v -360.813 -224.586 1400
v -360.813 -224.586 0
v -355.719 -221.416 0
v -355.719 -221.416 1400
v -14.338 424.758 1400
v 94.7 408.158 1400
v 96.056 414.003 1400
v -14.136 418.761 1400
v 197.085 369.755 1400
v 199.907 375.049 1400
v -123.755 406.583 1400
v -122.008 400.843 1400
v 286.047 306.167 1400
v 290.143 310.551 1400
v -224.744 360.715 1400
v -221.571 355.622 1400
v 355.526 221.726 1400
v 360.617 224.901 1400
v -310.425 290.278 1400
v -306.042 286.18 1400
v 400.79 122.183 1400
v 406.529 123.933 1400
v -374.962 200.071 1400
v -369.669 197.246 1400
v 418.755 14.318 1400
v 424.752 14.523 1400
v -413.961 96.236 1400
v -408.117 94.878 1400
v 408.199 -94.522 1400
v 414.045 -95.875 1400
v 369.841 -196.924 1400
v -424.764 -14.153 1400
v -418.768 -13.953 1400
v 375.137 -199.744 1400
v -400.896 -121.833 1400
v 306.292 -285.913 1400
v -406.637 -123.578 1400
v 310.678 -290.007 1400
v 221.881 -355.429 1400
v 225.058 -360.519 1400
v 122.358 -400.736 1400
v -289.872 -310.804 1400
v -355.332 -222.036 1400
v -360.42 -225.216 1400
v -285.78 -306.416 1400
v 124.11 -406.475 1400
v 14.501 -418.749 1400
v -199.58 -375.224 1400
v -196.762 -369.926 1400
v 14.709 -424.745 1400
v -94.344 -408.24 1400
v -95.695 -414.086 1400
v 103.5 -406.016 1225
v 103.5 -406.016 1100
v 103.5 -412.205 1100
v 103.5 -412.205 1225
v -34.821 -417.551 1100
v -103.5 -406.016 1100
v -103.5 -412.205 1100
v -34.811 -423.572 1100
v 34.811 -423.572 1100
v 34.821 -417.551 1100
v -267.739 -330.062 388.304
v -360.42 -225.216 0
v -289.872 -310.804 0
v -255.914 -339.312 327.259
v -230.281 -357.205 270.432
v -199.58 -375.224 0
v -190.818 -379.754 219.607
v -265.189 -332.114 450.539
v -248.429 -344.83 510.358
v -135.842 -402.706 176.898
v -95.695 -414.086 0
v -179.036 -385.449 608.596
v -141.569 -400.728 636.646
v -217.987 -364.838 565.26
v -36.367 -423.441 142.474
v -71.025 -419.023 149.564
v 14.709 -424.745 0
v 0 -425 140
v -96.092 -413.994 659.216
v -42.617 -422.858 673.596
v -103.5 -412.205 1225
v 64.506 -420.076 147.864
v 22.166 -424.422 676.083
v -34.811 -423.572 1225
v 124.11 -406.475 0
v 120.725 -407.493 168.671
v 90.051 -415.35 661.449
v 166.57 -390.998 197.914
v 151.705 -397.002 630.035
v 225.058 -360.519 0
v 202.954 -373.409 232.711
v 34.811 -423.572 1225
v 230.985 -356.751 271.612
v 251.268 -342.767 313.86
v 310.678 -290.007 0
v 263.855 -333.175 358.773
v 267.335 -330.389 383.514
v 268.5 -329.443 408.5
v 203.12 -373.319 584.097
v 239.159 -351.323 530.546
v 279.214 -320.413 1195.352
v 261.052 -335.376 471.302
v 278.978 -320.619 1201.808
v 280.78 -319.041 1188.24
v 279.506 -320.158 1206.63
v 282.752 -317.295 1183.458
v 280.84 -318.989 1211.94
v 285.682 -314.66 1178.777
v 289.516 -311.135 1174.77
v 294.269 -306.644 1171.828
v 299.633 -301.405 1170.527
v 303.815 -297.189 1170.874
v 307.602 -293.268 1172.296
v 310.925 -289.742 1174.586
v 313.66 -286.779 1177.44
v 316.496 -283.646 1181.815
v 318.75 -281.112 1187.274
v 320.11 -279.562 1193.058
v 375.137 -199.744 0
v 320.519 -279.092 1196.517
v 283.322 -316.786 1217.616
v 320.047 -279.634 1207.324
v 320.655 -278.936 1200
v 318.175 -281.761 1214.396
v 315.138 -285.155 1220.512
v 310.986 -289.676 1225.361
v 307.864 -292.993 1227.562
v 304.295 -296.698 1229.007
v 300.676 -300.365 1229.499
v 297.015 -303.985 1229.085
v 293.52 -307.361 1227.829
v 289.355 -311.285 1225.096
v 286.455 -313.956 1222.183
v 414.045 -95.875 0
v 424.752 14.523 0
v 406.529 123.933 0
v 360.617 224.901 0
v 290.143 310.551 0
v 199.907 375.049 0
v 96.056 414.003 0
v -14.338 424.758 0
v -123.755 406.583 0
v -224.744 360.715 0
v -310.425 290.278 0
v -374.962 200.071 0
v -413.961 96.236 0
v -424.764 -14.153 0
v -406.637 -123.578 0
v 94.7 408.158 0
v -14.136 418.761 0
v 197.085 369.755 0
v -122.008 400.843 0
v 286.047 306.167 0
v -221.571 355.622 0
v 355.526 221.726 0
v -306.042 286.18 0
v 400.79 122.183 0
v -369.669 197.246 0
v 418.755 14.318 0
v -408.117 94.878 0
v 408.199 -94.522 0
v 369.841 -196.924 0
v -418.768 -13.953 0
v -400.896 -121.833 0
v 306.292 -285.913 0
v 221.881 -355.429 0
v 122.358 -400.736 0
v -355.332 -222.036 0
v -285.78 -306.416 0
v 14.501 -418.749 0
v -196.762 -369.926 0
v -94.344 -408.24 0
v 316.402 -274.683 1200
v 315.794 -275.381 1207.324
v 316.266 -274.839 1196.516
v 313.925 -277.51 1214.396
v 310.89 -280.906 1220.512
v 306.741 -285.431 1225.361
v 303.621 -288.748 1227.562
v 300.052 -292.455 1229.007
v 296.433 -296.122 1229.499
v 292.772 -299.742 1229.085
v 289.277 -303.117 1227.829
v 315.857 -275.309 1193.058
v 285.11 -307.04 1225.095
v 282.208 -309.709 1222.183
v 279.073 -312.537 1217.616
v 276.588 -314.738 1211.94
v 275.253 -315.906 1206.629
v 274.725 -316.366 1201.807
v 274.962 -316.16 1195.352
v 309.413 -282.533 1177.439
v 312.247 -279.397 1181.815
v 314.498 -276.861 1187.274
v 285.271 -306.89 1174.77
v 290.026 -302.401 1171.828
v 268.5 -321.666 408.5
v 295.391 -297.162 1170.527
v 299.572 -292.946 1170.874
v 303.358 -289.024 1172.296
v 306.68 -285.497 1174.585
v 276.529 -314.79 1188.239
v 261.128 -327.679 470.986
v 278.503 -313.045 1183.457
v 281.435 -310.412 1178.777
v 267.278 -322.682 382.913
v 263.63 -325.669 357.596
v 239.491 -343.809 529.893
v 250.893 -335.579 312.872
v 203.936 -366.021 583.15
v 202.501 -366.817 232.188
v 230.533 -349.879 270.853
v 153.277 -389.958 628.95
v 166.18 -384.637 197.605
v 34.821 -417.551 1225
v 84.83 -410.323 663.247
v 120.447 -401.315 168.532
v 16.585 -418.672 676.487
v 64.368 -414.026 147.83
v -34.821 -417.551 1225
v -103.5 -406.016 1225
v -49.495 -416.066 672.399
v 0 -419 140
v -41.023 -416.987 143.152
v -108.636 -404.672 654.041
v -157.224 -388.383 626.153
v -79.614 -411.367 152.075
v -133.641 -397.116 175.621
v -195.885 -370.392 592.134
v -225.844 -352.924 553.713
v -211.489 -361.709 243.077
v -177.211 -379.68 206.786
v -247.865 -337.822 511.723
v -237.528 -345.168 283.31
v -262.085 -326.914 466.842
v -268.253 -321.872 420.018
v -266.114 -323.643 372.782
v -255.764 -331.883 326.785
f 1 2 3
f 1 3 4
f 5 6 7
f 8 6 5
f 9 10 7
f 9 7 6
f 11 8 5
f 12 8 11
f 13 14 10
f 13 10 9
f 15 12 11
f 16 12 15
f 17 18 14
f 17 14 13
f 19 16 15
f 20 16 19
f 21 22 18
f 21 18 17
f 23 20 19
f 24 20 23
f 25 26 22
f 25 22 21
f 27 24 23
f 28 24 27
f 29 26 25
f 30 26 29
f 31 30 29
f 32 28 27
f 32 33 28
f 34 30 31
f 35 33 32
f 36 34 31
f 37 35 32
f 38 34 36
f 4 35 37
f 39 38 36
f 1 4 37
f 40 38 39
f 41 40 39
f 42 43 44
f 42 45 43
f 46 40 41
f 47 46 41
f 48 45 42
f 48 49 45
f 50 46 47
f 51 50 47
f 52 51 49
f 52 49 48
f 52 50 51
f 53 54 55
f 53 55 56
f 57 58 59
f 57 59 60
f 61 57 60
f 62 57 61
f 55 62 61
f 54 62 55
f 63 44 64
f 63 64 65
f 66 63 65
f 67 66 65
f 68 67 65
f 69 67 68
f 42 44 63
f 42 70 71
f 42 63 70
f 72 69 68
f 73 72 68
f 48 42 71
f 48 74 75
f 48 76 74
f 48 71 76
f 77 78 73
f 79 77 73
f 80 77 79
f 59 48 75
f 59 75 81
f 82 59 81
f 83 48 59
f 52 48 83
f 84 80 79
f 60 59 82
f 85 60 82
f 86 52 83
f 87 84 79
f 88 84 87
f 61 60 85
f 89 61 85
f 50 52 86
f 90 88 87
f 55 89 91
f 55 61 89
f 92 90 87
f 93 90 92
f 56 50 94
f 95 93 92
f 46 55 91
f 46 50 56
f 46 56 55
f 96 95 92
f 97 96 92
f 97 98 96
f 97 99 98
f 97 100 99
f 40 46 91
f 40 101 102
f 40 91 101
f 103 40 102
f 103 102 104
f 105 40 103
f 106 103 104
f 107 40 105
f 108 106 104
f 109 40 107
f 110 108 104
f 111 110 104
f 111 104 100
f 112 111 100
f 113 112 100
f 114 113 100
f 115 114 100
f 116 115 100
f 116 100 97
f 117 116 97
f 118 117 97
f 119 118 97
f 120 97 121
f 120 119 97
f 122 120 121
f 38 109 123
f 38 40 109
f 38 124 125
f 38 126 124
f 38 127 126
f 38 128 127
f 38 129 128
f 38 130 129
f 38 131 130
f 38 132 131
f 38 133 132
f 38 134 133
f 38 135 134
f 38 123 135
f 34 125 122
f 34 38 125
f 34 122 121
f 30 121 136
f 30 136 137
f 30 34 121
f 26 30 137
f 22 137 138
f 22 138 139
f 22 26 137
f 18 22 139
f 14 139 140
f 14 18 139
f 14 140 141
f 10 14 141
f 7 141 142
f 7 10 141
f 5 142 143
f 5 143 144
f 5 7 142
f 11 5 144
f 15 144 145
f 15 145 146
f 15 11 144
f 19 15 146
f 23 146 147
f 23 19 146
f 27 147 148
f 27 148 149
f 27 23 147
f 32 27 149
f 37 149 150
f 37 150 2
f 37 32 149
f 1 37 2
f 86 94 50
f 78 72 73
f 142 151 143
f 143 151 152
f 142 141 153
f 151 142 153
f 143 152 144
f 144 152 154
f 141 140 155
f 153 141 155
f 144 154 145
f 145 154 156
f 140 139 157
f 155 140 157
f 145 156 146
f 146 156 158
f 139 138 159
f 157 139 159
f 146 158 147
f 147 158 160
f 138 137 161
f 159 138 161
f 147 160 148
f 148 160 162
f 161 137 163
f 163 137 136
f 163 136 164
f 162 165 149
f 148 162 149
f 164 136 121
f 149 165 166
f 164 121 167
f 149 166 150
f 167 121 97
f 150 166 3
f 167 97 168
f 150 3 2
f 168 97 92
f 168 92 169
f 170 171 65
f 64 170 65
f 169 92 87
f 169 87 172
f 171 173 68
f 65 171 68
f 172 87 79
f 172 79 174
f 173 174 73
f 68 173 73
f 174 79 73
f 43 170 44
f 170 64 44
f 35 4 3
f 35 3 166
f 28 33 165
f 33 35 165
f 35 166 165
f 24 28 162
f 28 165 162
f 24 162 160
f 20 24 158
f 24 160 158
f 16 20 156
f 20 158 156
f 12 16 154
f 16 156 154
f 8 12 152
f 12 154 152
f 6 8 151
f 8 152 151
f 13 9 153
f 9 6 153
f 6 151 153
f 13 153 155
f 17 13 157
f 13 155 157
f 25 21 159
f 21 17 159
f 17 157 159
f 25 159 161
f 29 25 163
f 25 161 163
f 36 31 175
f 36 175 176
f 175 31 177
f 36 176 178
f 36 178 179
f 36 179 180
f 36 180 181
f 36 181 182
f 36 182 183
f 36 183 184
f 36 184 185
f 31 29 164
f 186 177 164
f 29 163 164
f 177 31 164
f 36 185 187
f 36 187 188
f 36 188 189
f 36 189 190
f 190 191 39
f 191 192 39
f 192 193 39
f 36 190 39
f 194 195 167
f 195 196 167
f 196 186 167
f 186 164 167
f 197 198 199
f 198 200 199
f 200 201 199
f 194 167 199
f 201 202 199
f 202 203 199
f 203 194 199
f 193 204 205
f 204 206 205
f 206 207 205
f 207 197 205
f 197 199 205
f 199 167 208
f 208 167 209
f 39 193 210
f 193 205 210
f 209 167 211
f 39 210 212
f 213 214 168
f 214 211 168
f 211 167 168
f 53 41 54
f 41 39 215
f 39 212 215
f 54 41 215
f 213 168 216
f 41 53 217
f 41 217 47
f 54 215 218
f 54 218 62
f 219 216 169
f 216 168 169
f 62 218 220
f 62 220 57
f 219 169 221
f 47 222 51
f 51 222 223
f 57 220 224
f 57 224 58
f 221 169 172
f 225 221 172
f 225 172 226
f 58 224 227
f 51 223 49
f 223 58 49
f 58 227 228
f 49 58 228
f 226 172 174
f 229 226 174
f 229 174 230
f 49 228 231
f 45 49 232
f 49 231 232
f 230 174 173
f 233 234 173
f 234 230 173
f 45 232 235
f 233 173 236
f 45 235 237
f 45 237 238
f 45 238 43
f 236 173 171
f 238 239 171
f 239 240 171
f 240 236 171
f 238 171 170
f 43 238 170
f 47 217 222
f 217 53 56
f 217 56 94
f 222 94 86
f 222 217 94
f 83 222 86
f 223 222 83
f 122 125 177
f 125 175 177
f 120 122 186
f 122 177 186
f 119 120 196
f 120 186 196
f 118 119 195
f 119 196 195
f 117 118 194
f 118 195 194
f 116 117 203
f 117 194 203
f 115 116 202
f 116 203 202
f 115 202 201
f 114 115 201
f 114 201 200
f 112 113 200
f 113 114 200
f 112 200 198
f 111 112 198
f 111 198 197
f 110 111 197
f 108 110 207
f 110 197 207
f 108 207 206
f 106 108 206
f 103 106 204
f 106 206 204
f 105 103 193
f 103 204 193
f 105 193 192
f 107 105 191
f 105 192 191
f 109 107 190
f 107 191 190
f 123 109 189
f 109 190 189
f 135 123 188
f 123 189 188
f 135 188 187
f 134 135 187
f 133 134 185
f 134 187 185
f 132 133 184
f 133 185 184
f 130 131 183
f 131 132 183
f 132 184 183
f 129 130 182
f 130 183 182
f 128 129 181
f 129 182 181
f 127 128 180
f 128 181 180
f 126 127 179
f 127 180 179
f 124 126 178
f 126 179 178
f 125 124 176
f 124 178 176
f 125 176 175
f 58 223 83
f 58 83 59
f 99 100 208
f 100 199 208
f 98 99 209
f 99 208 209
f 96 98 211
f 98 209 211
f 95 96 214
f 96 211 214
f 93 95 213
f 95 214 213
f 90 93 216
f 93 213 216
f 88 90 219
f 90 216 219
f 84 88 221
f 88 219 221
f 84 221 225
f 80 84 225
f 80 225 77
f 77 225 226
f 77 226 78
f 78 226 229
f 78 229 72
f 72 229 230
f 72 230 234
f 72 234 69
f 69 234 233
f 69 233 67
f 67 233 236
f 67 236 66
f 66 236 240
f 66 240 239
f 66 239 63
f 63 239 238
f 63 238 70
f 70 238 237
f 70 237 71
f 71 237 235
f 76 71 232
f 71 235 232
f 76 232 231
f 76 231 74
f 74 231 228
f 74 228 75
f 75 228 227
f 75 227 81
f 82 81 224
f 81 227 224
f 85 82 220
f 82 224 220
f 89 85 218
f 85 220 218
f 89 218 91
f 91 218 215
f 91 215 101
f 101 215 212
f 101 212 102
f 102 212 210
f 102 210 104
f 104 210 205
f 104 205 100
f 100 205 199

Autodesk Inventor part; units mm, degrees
sketch "Sketch13" plane through (0, 0, 0) normal (0, 0, 1) x (1, 0, 0)
  circle A0 centre (0, 0) radius 425 construction
  line L0 (0, 0) -> (0, -425)
  line L1 (0, 0) -> (-360.4204, -225.2157)
  line L2 (0, 0) -> (300.5204, -300.5204)
  line L3 (0, 0) -> (0, -425)
  line L4 (0, 0) -> (0, -425)
  line L5 (0, 0) -> (-378.6778, -192.946)
  arc A1 (-360.4204, -225.2157) -> (0, -425) centre (0, 0) ccw
  dimension "d53" = 850
  dimension "d54" = 58
  dimension "d55" = 0
  dimension "d56" = 0
  dimension "d57" = 315
  dimension "d58" = 63
ref_plane "WeldJoint" through (0, 0, -10) normal (0.5299, -0.848, 0) x (0, 0, 1)
ref_plane "Outer" through (0, 0, -10) normal (0.454, -0.891, 0) x (0, 0, 1)
ref_plane "Clock_Feeder" through (0, 0, -10) normal (0.7071, 0.7071, 0) x (0, 0, 1)
ref_plane "Charging" through (0, 0, -10) normal (1, 0, 0) x (0, 0, 1)
ref_plane "Accsess" through (0, 0, -10) normal (1, 0, 0) x (0, 0, 1)
sketch "Sketch14" plane through (0, 0, -10) normal (0.5299, -0.848, 0) x (0, 0, 1)
  line L0 (1410, 419) -> (10, 419)
  line L1 (10, 419) -> (10, 425)
  line L2 (10, 425) -> (1410, 425)
  line L3 (1410, 425) -> (1410, 419)
  line L4 (10, 0) -> (825.0673, 0)
  point P0 (10, 422)
  dimension "d59" = 1400
  dimension "d60" = 6
  dimension "d61" = 850
revolve "Revolution2" add sketch "Sketch14" angle 359.9 about axis through (0, 0, 0) along (0, 0, 1)
sketch "Sketch AnglePlane_Feeder" plane through (0, 0, -10) normal (0.7071, 0.7071, 0) x (0, 0, 1)
  line L0 (10, -425) -> (10, 425) projected
  line L1 (10, 0) -> (1210, 0)
  line L2 (1210, 0) -> (1210, 425)
  line L3 (1210, 425) -> (10, 425)
  line L4 (10, 425) -> (10, 0)
  point P0 (10, -95.6042)
  point P1 (10, -96.3268)
  dimension "d63" = 850
  dimension "d64" = 90
  dimension "frd_hght" = 1200
ref_plane "AnglePlane_Feeder" through (0, 0, 1200) normal (0.7071, -0.7071, 0) x (0.7071, 0.7071, 0)
sketch "Sketch16" plane through (0, 0, 1200) normal (0.7071, -0.7071, 0) x (0.7071, 0.7071, 0)
  circle A0 centre (0, 0) radius 29.5
  point P0 (0, -1200)
  point P1 (0, 0)
  point P2 (0, 0)
  point P3 (0, 0)
  dimension "d66" = 59
extrude "Extrusion7" cut sketch "Sketch16" along normal through all
ref_plane "Work Plane16" through (0, 0, 0) normal (0, -1, 0) x (1, 0, 0)
sketch "Sketch17" plane through (0, 0, 0) normal (0, -1, 0) x (1, 0, 0)
  circle A0 centre (0, 408.5) radius 268.5
  line L0 (0, 140) -> (-495.5727, 140)
  point P0 (0, 0)
  dimension "d69" = 537
  dimension "d71" = 140
extrude "Extrusion8" cut sketch "Sketch17" along normal through all
sketch "Sketch19" plane through (0, 0, -10) normal (1, 0, 0) x (0, 0, 1)
  line L0 (10, 0) -> (1110, 0)
  line L1 (1110, 0) -> (1110, 425)
  line L2 (1110, 425) -> (10, 425)
  line L3 (10, 425) -> (10, 0)
  dimension "d74" = 1100
  dimension "d76" = 850
  dimension "d77" = 90
ref_plane "Work Plane18" through (0, 0, 1100) normal (0, -1, 0) x (1, 0, 0)
sketch "Sketch20" plane through (0, 0, 1100) normal (0, -1, 0) x (1, 0, 0)
  line L0 (-103.5, 0) -> (103.5, 0)
  line L1 (103.5, 0) -> (103.5, 125)
  line L2 (103.5, 125) -> (-103.5, 125)
  line L3 (-103.5, 125) -> (-103.5, 0)
  point P0 (0, -1100)
  point P1 (0, 0)
  point P2 (0, 0)
  point P3 (0, 0)
  point P4 (0, 0)
  dimension "d78" = 207
  dimension "d79" = 125
extrude "Extrusion9" cut sketch "Sketch20" along normal through all
equation "\"BendRadius\" = Thickness"
equation "\"BendReliefWidth\" = Thickness"
equation "\"BendReliefDepth\" = 0.5 * Thickness"
equation "\"CornerReliefSize\" = 4 * Thickness"
equation "\"MinimumRemnant\" = 2 * Thickness"
equation "\"TransitionRadius\" = BendRadius"
equation "\"JacobiRadiusSize\" = BendRadius"
equation "\"GapSize\" = Thickness"
equation "\"Feeder_horisont_angle\" = 0"
equation "\"Hatch_Accsess_diameter\" = 535"
equation "\"Clock_Accsess_angle\" = 0"
equation "\"Clock_Charging_agnle\" = 0"
equation "\"Clock_Feeder_angle\" = 315deg"
equation "\"Clock_Outer_angle\" = 63deg"
equation "\"Clock_WeldJoint_angle\" = 58deg"
equation "\"Thickness\" = 6"
properties part number "PNS 9110 main Shell D 940" material "Steel"
